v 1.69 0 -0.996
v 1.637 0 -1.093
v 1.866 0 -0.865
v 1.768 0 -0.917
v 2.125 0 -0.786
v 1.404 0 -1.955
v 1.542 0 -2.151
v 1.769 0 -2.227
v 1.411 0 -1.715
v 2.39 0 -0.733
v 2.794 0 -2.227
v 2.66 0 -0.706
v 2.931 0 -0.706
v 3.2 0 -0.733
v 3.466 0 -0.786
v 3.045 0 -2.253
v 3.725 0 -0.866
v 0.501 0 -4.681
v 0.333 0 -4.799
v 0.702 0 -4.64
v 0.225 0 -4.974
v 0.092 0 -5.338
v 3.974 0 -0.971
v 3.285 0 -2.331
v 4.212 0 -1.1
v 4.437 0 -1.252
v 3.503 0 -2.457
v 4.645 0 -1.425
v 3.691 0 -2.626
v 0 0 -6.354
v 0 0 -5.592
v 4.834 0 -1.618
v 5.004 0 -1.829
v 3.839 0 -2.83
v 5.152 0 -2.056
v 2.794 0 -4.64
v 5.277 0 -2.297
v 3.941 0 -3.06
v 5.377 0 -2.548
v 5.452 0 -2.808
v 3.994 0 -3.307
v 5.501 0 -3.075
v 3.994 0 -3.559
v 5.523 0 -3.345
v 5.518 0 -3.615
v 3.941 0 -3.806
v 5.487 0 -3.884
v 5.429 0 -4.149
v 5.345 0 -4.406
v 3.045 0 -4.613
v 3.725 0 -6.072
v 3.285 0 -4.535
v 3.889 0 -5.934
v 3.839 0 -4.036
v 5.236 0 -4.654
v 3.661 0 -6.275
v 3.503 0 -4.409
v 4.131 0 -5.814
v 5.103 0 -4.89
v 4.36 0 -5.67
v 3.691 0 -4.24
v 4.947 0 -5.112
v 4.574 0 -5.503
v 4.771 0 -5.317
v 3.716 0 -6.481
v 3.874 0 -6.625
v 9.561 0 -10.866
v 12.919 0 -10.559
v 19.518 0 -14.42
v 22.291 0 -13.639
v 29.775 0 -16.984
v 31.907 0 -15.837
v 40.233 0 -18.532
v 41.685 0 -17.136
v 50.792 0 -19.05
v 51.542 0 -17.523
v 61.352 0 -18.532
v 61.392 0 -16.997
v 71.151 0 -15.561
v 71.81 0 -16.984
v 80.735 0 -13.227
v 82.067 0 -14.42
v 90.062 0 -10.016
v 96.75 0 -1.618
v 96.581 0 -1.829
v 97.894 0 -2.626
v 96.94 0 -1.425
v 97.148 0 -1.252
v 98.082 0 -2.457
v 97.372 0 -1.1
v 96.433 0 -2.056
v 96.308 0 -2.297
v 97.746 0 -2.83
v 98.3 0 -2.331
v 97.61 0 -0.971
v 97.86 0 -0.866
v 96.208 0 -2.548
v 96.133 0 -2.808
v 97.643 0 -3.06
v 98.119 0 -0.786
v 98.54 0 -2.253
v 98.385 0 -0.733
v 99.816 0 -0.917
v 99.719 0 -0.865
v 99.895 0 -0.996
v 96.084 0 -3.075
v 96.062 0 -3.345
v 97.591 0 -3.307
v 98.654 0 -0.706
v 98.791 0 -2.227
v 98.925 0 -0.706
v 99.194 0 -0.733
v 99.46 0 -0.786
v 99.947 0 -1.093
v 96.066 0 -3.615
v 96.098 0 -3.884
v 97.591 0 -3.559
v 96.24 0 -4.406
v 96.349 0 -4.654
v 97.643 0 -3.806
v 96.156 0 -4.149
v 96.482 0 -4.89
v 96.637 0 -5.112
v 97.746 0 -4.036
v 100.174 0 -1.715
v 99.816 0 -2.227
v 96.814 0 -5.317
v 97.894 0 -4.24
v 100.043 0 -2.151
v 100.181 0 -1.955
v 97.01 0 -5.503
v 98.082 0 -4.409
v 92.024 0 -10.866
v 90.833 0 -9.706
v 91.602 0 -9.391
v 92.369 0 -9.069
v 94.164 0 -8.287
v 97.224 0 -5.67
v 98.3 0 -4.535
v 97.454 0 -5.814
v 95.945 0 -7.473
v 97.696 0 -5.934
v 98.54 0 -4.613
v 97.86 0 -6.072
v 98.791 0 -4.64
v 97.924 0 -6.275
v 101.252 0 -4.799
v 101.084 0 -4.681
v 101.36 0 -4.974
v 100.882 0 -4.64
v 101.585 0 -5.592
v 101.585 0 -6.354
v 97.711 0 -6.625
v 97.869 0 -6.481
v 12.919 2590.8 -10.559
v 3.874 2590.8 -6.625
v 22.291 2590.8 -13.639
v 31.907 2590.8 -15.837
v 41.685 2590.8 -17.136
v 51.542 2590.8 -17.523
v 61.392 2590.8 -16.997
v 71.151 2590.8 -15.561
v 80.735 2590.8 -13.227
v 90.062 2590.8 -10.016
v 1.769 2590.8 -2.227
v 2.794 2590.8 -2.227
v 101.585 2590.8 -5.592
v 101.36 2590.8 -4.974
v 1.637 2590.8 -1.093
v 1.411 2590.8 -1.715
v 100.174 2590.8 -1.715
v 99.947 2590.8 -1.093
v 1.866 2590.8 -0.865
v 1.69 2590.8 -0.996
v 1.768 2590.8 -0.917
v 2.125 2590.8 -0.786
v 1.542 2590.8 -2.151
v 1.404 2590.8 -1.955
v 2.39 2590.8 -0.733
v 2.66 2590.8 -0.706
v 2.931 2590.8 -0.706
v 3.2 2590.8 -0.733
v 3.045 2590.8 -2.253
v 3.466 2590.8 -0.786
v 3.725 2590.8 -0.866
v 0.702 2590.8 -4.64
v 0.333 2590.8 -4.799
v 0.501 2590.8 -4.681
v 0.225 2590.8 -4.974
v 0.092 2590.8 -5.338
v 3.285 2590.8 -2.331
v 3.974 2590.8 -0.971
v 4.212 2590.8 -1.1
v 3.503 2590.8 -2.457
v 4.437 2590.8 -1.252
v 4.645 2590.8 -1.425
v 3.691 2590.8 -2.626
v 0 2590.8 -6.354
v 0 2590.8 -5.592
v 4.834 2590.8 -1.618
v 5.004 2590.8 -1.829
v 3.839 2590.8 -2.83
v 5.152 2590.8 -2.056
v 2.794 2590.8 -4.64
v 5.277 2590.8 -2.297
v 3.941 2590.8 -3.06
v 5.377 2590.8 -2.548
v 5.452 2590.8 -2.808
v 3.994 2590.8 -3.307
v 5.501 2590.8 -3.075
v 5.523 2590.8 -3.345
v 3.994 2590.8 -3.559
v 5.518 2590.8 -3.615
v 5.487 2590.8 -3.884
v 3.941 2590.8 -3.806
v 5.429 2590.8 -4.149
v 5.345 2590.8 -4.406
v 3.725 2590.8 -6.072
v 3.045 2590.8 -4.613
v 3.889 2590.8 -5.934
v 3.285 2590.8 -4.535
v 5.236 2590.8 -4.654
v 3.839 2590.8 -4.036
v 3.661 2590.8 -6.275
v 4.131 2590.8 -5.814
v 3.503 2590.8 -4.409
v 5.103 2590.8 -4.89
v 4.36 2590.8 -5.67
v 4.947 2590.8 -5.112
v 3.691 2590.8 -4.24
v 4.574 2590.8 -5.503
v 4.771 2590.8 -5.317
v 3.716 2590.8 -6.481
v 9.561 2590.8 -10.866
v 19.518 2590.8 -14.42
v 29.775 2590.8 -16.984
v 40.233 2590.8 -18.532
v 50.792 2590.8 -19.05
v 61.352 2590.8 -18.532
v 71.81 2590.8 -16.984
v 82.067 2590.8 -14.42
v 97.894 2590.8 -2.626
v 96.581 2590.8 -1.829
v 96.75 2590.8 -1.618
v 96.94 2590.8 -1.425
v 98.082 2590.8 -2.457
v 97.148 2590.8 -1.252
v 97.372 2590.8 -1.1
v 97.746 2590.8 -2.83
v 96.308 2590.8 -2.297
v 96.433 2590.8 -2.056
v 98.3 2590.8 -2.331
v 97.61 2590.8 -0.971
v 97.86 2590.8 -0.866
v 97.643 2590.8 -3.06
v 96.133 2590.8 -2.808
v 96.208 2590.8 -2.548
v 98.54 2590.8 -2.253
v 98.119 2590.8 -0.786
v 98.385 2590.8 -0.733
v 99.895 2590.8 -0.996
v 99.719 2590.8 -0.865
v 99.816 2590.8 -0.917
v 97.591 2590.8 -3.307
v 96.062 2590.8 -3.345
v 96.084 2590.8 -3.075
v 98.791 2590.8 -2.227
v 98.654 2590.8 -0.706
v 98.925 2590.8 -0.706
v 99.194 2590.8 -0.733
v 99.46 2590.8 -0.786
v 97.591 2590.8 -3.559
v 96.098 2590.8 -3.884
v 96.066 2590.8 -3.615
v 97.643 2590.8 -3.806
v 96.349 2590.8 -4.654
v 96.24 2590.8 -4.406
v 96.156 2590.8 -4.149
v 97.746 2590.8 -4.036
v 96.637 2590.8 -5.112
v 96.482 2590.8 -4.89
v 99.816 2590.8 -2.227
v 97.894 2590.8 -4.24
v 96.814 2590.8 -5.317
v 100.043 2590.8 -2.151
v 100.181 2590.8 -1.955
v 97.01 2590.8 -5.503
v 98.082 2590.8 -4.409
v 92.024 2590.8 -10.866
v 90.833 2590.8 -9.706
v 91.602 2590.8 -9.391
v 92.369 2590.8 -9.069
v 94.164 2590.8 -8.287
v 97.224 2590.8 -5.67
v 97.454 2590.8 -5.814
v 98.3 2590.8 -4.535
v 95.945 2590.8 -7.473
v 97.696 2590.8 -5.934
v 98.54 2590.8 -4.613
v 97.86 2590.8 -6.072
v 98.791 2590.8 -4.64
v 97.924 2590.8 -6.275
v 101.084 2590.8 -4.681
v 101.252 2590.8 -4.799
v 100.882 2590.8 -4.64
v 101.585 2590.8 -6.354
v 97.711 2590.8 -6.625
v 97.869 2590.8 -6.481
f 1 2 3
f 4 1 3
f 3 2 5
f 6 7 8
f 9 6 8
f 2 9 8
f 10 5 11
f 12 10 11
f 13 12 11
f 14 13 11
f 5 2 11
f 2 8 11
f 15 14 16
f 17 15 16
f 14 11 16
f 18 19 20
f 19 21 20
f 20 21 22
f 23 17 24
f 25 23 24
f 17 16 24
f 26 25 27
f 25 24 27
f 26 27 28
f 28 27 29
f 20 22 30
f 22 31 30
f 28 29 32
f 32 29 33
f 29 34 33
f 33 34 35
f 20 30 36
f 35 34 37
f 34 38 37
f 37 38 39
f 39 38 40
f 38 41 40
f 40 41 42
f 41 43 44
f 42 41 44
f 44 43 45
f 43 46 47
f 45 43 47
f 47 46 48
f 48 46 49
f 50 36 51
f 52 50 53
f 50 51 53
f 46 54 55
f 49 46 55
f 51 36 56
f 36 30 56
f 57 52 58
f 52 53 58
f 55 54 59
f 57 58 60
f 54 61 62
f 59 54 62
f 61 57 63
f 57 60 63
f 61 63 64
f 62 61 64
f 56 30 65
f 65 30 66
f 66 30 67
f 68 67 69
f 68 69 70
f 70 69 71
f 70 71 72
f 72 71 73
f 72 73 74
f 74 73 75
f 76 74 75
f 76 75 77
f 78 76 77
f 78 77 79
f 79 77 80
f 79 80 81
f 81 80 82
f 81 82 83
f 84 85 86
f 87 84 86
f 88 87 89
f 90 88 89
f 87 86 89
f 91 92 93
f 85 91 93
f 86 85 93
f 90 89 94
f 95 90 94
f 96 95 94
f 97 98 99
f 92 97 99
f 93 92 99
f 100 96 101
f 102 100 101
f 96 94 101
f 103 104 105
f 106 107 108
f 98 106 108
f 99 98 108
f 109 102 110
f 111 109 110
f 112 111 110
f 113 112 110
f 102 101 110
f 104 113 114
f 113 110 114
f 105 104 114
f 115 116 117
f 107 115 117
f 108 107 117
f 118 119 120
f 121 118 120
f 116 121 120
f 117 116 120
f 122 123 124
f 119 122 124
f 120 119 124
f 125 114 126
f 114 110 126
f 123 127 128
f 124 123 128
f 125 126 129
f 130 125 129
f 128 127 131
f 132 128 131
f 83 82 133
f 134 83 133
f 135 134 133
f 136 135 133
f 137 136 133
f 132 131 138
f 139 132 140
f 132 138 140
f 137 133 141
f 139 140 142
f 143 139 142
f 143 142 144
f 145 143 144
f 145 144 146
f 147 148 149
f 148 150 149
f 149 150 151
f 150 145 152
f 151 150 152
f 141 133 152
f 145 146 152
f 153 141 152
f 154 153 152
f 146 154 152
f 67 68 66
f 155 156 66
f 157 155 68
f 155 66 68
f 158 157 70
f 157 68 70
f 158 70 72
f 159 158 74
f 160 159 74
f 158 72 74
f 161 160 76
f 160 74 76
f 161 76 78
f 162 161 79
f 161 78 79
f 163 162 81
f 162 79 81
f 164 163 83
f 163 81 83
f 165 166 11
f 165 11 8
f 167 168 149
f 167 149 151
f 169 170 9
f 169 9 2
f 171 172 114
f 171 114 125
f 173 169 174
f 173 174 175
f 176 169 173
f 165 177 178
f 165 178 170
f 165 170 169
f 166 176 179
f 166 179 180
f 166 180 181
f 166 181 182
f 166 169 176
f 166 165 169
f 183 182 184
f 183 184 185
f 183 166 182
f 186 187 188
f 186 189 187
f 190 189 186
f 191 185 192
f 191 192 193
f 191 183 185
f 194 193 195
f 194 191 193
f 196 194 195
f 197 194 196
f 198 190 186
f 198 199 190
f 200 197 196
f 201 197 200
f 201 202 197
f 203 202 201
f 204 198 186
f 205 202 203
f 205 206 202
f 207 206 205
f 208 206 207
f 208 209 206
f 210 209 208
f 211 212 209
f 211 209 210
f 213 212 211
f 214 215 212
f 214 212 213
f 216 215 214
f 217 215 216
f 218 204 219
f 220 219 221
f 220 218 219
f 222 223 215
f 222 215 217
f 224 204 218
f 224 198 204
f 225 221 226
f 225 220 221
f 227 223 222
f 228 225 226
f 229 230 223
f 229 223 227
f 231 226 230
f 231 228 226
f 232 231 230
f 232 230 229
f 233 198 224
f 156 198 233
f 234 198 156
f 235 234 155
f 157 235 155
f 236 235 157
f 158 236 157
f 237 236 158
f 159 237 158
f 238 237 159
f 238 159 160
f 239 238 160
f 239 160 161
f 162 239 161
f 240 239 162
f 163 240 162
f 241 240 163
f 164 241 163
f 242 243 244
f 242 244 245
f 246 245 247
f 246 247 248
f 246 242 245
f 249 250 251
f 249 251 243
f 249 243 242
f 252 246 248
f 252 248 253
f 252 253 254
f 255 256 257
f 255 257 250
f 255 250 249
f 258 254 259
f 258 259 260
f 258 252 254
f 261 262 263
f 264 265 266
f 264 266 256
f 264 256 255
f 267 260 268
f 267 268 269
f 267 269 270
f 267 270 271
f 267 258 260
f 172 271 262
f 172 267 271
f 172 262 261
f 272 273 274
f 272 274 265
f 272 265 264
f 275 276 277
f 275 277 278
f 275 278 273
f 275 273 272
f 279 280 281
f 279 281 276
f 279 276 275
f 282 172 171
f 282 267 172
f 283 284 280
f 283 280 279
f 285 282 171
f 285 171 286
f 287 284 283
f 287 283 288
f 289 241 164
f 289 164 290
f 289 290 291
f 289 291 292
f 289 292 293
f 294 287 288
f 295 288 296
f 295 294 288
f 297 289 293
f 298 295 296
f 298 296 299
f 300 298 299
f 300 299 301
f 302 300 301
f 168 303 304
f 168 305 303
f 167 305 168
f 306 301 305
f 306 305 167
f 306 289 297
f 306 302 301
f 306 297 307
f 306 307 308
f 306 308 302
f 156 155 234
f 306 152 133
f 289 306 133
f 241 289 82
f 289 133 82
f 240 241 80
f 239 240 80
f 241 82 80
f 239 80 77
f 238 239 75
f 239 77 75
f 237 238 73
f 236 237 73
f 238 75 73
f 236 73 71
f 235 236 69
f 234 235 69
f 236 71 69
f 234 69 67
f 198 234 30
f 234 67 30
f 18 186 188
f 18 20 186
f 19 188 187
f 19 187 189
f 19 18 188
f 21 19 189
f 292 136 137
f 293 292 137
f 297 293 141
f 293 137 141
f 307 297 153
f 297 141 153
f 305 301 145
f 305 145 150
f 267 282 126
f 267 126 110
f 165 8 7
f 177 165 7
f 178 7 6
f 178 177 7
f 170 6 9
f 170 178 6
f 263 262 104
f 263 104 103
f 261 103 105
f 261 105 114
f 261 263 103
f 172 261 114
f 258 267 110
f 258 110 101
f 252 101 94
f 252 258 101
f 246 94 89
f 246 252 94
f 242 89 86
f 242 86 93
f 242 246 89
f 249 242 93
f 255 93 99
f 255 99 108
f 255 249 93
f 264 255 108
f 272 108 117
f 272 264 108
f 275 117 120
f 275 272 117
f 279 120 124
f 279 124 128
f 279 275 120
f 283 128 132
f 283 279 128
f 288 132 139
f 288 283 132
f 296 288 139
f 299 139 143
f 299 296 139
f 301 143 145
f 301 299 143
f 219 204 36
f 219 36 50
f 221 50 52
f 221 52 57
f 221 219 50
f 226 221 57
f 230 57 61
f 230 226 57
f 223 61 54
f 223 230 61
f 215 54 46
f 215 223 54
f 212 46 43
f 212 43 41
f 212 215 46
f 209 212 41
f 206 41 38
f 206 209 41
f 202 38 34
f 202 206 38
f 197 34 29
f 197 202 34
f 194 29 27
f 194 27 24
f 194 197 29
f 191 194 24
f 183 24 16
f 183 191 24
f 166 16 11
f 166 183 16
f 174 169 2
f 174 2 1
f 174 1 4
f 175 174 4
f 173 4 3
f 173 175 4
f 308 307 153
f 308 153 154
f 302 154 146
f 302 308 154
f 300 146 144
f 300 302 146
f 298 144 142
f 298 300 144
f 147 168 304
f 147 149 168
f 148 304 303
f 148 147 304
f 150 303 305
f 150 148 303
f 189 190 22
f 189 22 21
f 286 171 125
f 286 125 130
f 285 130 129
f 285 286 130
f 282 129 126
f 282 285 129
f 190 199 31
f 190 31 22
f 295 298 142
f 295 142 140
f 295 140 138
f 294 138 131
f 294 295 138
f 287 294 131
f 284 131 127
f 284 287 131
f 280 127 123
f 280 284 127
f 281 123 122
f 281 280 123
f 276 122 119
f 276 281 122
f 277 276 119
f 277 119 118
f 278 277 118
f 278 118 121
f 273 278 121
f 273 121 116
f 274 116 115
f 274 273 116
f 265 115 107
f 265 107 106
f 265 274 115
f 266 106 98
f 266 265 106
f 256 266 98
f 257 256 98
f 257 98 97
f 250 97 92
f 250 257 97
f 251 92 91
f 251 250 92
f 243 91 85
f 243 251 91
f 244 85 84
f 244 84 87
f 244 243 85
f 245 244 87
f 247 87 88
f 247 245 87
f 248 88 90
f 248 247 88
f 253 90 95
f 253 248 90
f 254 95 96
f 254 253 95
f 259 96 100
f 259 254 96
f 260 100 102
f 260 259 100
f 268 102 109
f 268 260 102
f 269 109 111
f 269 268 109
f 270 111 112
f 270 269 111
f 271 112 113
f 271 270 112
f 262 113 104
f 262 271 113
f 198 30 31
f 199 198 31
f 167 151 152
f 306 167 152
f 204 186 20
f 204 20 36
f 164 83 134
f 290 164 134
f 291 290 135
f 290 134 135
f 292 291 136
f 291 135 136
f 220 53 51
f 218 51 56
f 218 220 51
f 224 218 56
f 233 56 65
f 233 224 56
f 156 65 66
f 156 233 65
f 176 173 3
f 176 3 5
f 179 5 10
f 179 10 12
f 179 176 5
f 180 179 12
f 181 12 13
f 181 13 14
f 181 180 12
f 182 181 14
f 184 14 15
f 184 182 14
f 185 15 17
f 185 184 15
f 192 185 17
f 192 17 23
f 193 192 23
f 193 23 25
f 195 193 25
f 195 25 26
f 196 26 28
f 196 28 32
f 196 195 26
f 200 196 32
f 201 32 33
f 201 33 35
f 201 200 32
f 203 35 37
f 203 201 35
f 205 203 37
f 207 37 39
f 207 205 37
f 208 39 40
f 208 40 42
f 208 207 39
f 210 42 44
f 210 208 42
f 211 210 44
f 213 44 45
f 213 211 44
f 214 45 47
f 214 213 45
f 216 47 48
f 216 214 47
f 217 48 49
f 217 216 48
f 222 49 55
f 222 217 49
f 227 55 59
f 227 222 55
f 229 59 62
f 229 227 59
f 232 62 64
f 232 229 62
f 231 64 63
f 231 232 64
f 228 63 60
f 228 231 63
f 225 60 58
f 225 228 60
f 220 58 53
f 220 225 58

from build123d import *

# Parameters (mm, degrees)
BOSS_EXTRUDE1_DEPTH = 2590.8
CUT_EXTRUDE1_DEPTH  = 2591.8
BOSS_EXTRUDE2_DEPTH = 2590.8
FILLET1_R           = 0.508


with BuildPart() as part:
    # Sketch1 → Boss-Extrude1 (new body)
    with BuildSketch(Plane(origin=(0, 0, 0), x_dir=(1, 0, 0), z_dir=(0, 1, 0))):
        with BuildLine():
            Line((101.58476, 5.338063609), (101.58476, 6.354063609))
            ThreePointArc((101.58476, 6.354063609), (50.79238, 19.05), (0, 6.354063609))
            Line((0, 6.354063609), (0, 5.338063609))
            Line((0, 5.338063609), (1.338554634, 5.338063609))
            ThreePointArc((1.338554634, 5.338063609), (45.188812602, 17.378377427), (90.062082389, 10.016044959))
            ThreePointArc((90.062082389, 10.016044959), (91.218156641, 9.549225792), (92.368682931, 9.068895628))
            ThreePointArc((92.368682931, 9.068895628), (96.251044015, 7.328911154), (100.06076, 5.435148318))
            Line((100.06076, 5.435148318), (100.06076, 4.322063609))
            ThreePointArc((100.06076, 4.322063609), (100.209549755, 3.962853364), (100.56876, 3.814063609))
            Line((100.56876, 3.814063609), (100.82276, 3.814063609))
            Line((100.82276, 3.814063609), (101.58476, 5.338063609))
        make_face()
    extrude(amount=BOSS_EXTRUDE1_DEPTH)

    # Sketch3 → Cut-Extrude1 (cut, through all)
    with BuildSketch(Plane(origin=(0, 2590.8, 0), x_dir=(1, 0, 0), z_dir=(0, 1, 0))):
        Polygon((100.06076, 2.923708758), (101.58476, 2.923708758), (101.58476, 5.592063609), (100.06076, 5.435148318), align=None)
        Polygon((0, 5.592063609), (0.4067845, 4.474432381), (0, 4.474432381), align=None)
    extrude(amount=-CUT_EXTRUDE1_DEPTH, mode=Mode.SUBTRACT)

    # Sketch2 → Boss-Extrude2 (add)
    with BuildSketch(Plane(origin=(0, 2590.8, 0), x_dir=(1, 0, 0), z_dir=(0, 1, 0))):
        with BuildLine():
            Line((101.238078351, 4.639563606), (101.58476, 5.592063609))
            Line((101.58476, 5.592063609), (97.711183428, 6.625490634))
            ThreePointArc((97.711183428, 6.625490634), (97.924124129, 6.275131553), (97.695976798, 5.934479203))
            ThreePointArc((97.695976798, 5.934479203), (96.254692814, 2.421137976), (99.718733273, 0.865088556))
            ThreePointArc((99.718733273, 0.865088556), (99.858345852, 0.953692868), (99.947271519, 1.093100982))
            Line((99.947271519, 1.093100982), (100.173716674, 1.715253931))
            ThreePointArc((100.173716674, 1.715253931), (100.127790714, 2.064096228), (99.815693785, 2.226563606))
            Line((99.815693785, 2.226563606), (98.79076, 2.226563606))
            ThreePointArc((98.79076, 2.226563606), (97.58426, 3.433063606), (98.79076, 4.639563606))
            Line((98.79076, 4.639563606), (101.238078351, 4.639563606))
        make_face()
        with BuildLine():
            ThreePointArc((1.769066215, 2.226563606), (1.456969286, 2.064096228), (1.411043326, 1.715253931))
            Line((1.411043326, 1.715253931), (1.637488481, 1.093100982))
            ThreePointArc((1.637488481, 1.093100982), (1.726414148, 0.953692868), (1.866026727, 0.865088556))
            ThreePointArc((1.866026727, 0.865088556), (5.330067186, 2.421137976), (3.888783202, 5.934479203))
            ThreePointArc((3.888783202, 5.934479203), (3.660635871, 6.275131553), (3.873576572, 6.625490634))
            Line((3.873576572, 6.625490634), (0, 5.592063609))
            Line((0, 5.592063609), (0.346681649, 4.639563606))
            Line((0.346681649, 4.639563606), (2.794, 4.639563606))
            ThreePointArc((2.794, 4.639563606), (4.0005, 3.433063606), (2.794, 2.226563606))
            Line((2.794, 2.226563606), (1.769066215, 2.226563606))
        make_face()
    extrude(amount=-BOSS_EXTRUDE2_DEPTH)

    # Fillet1
    fillet1_edges = [part.edges().sort_by_distance(p)[0] for p in [
        (101.238078351, 1295.4, -4.639563606),
        (0.346681649, 1295.4, -4.639563606),
    ]]
    fillet(fillet1_edges, radius=FILLET1_R)


solid = part.part
